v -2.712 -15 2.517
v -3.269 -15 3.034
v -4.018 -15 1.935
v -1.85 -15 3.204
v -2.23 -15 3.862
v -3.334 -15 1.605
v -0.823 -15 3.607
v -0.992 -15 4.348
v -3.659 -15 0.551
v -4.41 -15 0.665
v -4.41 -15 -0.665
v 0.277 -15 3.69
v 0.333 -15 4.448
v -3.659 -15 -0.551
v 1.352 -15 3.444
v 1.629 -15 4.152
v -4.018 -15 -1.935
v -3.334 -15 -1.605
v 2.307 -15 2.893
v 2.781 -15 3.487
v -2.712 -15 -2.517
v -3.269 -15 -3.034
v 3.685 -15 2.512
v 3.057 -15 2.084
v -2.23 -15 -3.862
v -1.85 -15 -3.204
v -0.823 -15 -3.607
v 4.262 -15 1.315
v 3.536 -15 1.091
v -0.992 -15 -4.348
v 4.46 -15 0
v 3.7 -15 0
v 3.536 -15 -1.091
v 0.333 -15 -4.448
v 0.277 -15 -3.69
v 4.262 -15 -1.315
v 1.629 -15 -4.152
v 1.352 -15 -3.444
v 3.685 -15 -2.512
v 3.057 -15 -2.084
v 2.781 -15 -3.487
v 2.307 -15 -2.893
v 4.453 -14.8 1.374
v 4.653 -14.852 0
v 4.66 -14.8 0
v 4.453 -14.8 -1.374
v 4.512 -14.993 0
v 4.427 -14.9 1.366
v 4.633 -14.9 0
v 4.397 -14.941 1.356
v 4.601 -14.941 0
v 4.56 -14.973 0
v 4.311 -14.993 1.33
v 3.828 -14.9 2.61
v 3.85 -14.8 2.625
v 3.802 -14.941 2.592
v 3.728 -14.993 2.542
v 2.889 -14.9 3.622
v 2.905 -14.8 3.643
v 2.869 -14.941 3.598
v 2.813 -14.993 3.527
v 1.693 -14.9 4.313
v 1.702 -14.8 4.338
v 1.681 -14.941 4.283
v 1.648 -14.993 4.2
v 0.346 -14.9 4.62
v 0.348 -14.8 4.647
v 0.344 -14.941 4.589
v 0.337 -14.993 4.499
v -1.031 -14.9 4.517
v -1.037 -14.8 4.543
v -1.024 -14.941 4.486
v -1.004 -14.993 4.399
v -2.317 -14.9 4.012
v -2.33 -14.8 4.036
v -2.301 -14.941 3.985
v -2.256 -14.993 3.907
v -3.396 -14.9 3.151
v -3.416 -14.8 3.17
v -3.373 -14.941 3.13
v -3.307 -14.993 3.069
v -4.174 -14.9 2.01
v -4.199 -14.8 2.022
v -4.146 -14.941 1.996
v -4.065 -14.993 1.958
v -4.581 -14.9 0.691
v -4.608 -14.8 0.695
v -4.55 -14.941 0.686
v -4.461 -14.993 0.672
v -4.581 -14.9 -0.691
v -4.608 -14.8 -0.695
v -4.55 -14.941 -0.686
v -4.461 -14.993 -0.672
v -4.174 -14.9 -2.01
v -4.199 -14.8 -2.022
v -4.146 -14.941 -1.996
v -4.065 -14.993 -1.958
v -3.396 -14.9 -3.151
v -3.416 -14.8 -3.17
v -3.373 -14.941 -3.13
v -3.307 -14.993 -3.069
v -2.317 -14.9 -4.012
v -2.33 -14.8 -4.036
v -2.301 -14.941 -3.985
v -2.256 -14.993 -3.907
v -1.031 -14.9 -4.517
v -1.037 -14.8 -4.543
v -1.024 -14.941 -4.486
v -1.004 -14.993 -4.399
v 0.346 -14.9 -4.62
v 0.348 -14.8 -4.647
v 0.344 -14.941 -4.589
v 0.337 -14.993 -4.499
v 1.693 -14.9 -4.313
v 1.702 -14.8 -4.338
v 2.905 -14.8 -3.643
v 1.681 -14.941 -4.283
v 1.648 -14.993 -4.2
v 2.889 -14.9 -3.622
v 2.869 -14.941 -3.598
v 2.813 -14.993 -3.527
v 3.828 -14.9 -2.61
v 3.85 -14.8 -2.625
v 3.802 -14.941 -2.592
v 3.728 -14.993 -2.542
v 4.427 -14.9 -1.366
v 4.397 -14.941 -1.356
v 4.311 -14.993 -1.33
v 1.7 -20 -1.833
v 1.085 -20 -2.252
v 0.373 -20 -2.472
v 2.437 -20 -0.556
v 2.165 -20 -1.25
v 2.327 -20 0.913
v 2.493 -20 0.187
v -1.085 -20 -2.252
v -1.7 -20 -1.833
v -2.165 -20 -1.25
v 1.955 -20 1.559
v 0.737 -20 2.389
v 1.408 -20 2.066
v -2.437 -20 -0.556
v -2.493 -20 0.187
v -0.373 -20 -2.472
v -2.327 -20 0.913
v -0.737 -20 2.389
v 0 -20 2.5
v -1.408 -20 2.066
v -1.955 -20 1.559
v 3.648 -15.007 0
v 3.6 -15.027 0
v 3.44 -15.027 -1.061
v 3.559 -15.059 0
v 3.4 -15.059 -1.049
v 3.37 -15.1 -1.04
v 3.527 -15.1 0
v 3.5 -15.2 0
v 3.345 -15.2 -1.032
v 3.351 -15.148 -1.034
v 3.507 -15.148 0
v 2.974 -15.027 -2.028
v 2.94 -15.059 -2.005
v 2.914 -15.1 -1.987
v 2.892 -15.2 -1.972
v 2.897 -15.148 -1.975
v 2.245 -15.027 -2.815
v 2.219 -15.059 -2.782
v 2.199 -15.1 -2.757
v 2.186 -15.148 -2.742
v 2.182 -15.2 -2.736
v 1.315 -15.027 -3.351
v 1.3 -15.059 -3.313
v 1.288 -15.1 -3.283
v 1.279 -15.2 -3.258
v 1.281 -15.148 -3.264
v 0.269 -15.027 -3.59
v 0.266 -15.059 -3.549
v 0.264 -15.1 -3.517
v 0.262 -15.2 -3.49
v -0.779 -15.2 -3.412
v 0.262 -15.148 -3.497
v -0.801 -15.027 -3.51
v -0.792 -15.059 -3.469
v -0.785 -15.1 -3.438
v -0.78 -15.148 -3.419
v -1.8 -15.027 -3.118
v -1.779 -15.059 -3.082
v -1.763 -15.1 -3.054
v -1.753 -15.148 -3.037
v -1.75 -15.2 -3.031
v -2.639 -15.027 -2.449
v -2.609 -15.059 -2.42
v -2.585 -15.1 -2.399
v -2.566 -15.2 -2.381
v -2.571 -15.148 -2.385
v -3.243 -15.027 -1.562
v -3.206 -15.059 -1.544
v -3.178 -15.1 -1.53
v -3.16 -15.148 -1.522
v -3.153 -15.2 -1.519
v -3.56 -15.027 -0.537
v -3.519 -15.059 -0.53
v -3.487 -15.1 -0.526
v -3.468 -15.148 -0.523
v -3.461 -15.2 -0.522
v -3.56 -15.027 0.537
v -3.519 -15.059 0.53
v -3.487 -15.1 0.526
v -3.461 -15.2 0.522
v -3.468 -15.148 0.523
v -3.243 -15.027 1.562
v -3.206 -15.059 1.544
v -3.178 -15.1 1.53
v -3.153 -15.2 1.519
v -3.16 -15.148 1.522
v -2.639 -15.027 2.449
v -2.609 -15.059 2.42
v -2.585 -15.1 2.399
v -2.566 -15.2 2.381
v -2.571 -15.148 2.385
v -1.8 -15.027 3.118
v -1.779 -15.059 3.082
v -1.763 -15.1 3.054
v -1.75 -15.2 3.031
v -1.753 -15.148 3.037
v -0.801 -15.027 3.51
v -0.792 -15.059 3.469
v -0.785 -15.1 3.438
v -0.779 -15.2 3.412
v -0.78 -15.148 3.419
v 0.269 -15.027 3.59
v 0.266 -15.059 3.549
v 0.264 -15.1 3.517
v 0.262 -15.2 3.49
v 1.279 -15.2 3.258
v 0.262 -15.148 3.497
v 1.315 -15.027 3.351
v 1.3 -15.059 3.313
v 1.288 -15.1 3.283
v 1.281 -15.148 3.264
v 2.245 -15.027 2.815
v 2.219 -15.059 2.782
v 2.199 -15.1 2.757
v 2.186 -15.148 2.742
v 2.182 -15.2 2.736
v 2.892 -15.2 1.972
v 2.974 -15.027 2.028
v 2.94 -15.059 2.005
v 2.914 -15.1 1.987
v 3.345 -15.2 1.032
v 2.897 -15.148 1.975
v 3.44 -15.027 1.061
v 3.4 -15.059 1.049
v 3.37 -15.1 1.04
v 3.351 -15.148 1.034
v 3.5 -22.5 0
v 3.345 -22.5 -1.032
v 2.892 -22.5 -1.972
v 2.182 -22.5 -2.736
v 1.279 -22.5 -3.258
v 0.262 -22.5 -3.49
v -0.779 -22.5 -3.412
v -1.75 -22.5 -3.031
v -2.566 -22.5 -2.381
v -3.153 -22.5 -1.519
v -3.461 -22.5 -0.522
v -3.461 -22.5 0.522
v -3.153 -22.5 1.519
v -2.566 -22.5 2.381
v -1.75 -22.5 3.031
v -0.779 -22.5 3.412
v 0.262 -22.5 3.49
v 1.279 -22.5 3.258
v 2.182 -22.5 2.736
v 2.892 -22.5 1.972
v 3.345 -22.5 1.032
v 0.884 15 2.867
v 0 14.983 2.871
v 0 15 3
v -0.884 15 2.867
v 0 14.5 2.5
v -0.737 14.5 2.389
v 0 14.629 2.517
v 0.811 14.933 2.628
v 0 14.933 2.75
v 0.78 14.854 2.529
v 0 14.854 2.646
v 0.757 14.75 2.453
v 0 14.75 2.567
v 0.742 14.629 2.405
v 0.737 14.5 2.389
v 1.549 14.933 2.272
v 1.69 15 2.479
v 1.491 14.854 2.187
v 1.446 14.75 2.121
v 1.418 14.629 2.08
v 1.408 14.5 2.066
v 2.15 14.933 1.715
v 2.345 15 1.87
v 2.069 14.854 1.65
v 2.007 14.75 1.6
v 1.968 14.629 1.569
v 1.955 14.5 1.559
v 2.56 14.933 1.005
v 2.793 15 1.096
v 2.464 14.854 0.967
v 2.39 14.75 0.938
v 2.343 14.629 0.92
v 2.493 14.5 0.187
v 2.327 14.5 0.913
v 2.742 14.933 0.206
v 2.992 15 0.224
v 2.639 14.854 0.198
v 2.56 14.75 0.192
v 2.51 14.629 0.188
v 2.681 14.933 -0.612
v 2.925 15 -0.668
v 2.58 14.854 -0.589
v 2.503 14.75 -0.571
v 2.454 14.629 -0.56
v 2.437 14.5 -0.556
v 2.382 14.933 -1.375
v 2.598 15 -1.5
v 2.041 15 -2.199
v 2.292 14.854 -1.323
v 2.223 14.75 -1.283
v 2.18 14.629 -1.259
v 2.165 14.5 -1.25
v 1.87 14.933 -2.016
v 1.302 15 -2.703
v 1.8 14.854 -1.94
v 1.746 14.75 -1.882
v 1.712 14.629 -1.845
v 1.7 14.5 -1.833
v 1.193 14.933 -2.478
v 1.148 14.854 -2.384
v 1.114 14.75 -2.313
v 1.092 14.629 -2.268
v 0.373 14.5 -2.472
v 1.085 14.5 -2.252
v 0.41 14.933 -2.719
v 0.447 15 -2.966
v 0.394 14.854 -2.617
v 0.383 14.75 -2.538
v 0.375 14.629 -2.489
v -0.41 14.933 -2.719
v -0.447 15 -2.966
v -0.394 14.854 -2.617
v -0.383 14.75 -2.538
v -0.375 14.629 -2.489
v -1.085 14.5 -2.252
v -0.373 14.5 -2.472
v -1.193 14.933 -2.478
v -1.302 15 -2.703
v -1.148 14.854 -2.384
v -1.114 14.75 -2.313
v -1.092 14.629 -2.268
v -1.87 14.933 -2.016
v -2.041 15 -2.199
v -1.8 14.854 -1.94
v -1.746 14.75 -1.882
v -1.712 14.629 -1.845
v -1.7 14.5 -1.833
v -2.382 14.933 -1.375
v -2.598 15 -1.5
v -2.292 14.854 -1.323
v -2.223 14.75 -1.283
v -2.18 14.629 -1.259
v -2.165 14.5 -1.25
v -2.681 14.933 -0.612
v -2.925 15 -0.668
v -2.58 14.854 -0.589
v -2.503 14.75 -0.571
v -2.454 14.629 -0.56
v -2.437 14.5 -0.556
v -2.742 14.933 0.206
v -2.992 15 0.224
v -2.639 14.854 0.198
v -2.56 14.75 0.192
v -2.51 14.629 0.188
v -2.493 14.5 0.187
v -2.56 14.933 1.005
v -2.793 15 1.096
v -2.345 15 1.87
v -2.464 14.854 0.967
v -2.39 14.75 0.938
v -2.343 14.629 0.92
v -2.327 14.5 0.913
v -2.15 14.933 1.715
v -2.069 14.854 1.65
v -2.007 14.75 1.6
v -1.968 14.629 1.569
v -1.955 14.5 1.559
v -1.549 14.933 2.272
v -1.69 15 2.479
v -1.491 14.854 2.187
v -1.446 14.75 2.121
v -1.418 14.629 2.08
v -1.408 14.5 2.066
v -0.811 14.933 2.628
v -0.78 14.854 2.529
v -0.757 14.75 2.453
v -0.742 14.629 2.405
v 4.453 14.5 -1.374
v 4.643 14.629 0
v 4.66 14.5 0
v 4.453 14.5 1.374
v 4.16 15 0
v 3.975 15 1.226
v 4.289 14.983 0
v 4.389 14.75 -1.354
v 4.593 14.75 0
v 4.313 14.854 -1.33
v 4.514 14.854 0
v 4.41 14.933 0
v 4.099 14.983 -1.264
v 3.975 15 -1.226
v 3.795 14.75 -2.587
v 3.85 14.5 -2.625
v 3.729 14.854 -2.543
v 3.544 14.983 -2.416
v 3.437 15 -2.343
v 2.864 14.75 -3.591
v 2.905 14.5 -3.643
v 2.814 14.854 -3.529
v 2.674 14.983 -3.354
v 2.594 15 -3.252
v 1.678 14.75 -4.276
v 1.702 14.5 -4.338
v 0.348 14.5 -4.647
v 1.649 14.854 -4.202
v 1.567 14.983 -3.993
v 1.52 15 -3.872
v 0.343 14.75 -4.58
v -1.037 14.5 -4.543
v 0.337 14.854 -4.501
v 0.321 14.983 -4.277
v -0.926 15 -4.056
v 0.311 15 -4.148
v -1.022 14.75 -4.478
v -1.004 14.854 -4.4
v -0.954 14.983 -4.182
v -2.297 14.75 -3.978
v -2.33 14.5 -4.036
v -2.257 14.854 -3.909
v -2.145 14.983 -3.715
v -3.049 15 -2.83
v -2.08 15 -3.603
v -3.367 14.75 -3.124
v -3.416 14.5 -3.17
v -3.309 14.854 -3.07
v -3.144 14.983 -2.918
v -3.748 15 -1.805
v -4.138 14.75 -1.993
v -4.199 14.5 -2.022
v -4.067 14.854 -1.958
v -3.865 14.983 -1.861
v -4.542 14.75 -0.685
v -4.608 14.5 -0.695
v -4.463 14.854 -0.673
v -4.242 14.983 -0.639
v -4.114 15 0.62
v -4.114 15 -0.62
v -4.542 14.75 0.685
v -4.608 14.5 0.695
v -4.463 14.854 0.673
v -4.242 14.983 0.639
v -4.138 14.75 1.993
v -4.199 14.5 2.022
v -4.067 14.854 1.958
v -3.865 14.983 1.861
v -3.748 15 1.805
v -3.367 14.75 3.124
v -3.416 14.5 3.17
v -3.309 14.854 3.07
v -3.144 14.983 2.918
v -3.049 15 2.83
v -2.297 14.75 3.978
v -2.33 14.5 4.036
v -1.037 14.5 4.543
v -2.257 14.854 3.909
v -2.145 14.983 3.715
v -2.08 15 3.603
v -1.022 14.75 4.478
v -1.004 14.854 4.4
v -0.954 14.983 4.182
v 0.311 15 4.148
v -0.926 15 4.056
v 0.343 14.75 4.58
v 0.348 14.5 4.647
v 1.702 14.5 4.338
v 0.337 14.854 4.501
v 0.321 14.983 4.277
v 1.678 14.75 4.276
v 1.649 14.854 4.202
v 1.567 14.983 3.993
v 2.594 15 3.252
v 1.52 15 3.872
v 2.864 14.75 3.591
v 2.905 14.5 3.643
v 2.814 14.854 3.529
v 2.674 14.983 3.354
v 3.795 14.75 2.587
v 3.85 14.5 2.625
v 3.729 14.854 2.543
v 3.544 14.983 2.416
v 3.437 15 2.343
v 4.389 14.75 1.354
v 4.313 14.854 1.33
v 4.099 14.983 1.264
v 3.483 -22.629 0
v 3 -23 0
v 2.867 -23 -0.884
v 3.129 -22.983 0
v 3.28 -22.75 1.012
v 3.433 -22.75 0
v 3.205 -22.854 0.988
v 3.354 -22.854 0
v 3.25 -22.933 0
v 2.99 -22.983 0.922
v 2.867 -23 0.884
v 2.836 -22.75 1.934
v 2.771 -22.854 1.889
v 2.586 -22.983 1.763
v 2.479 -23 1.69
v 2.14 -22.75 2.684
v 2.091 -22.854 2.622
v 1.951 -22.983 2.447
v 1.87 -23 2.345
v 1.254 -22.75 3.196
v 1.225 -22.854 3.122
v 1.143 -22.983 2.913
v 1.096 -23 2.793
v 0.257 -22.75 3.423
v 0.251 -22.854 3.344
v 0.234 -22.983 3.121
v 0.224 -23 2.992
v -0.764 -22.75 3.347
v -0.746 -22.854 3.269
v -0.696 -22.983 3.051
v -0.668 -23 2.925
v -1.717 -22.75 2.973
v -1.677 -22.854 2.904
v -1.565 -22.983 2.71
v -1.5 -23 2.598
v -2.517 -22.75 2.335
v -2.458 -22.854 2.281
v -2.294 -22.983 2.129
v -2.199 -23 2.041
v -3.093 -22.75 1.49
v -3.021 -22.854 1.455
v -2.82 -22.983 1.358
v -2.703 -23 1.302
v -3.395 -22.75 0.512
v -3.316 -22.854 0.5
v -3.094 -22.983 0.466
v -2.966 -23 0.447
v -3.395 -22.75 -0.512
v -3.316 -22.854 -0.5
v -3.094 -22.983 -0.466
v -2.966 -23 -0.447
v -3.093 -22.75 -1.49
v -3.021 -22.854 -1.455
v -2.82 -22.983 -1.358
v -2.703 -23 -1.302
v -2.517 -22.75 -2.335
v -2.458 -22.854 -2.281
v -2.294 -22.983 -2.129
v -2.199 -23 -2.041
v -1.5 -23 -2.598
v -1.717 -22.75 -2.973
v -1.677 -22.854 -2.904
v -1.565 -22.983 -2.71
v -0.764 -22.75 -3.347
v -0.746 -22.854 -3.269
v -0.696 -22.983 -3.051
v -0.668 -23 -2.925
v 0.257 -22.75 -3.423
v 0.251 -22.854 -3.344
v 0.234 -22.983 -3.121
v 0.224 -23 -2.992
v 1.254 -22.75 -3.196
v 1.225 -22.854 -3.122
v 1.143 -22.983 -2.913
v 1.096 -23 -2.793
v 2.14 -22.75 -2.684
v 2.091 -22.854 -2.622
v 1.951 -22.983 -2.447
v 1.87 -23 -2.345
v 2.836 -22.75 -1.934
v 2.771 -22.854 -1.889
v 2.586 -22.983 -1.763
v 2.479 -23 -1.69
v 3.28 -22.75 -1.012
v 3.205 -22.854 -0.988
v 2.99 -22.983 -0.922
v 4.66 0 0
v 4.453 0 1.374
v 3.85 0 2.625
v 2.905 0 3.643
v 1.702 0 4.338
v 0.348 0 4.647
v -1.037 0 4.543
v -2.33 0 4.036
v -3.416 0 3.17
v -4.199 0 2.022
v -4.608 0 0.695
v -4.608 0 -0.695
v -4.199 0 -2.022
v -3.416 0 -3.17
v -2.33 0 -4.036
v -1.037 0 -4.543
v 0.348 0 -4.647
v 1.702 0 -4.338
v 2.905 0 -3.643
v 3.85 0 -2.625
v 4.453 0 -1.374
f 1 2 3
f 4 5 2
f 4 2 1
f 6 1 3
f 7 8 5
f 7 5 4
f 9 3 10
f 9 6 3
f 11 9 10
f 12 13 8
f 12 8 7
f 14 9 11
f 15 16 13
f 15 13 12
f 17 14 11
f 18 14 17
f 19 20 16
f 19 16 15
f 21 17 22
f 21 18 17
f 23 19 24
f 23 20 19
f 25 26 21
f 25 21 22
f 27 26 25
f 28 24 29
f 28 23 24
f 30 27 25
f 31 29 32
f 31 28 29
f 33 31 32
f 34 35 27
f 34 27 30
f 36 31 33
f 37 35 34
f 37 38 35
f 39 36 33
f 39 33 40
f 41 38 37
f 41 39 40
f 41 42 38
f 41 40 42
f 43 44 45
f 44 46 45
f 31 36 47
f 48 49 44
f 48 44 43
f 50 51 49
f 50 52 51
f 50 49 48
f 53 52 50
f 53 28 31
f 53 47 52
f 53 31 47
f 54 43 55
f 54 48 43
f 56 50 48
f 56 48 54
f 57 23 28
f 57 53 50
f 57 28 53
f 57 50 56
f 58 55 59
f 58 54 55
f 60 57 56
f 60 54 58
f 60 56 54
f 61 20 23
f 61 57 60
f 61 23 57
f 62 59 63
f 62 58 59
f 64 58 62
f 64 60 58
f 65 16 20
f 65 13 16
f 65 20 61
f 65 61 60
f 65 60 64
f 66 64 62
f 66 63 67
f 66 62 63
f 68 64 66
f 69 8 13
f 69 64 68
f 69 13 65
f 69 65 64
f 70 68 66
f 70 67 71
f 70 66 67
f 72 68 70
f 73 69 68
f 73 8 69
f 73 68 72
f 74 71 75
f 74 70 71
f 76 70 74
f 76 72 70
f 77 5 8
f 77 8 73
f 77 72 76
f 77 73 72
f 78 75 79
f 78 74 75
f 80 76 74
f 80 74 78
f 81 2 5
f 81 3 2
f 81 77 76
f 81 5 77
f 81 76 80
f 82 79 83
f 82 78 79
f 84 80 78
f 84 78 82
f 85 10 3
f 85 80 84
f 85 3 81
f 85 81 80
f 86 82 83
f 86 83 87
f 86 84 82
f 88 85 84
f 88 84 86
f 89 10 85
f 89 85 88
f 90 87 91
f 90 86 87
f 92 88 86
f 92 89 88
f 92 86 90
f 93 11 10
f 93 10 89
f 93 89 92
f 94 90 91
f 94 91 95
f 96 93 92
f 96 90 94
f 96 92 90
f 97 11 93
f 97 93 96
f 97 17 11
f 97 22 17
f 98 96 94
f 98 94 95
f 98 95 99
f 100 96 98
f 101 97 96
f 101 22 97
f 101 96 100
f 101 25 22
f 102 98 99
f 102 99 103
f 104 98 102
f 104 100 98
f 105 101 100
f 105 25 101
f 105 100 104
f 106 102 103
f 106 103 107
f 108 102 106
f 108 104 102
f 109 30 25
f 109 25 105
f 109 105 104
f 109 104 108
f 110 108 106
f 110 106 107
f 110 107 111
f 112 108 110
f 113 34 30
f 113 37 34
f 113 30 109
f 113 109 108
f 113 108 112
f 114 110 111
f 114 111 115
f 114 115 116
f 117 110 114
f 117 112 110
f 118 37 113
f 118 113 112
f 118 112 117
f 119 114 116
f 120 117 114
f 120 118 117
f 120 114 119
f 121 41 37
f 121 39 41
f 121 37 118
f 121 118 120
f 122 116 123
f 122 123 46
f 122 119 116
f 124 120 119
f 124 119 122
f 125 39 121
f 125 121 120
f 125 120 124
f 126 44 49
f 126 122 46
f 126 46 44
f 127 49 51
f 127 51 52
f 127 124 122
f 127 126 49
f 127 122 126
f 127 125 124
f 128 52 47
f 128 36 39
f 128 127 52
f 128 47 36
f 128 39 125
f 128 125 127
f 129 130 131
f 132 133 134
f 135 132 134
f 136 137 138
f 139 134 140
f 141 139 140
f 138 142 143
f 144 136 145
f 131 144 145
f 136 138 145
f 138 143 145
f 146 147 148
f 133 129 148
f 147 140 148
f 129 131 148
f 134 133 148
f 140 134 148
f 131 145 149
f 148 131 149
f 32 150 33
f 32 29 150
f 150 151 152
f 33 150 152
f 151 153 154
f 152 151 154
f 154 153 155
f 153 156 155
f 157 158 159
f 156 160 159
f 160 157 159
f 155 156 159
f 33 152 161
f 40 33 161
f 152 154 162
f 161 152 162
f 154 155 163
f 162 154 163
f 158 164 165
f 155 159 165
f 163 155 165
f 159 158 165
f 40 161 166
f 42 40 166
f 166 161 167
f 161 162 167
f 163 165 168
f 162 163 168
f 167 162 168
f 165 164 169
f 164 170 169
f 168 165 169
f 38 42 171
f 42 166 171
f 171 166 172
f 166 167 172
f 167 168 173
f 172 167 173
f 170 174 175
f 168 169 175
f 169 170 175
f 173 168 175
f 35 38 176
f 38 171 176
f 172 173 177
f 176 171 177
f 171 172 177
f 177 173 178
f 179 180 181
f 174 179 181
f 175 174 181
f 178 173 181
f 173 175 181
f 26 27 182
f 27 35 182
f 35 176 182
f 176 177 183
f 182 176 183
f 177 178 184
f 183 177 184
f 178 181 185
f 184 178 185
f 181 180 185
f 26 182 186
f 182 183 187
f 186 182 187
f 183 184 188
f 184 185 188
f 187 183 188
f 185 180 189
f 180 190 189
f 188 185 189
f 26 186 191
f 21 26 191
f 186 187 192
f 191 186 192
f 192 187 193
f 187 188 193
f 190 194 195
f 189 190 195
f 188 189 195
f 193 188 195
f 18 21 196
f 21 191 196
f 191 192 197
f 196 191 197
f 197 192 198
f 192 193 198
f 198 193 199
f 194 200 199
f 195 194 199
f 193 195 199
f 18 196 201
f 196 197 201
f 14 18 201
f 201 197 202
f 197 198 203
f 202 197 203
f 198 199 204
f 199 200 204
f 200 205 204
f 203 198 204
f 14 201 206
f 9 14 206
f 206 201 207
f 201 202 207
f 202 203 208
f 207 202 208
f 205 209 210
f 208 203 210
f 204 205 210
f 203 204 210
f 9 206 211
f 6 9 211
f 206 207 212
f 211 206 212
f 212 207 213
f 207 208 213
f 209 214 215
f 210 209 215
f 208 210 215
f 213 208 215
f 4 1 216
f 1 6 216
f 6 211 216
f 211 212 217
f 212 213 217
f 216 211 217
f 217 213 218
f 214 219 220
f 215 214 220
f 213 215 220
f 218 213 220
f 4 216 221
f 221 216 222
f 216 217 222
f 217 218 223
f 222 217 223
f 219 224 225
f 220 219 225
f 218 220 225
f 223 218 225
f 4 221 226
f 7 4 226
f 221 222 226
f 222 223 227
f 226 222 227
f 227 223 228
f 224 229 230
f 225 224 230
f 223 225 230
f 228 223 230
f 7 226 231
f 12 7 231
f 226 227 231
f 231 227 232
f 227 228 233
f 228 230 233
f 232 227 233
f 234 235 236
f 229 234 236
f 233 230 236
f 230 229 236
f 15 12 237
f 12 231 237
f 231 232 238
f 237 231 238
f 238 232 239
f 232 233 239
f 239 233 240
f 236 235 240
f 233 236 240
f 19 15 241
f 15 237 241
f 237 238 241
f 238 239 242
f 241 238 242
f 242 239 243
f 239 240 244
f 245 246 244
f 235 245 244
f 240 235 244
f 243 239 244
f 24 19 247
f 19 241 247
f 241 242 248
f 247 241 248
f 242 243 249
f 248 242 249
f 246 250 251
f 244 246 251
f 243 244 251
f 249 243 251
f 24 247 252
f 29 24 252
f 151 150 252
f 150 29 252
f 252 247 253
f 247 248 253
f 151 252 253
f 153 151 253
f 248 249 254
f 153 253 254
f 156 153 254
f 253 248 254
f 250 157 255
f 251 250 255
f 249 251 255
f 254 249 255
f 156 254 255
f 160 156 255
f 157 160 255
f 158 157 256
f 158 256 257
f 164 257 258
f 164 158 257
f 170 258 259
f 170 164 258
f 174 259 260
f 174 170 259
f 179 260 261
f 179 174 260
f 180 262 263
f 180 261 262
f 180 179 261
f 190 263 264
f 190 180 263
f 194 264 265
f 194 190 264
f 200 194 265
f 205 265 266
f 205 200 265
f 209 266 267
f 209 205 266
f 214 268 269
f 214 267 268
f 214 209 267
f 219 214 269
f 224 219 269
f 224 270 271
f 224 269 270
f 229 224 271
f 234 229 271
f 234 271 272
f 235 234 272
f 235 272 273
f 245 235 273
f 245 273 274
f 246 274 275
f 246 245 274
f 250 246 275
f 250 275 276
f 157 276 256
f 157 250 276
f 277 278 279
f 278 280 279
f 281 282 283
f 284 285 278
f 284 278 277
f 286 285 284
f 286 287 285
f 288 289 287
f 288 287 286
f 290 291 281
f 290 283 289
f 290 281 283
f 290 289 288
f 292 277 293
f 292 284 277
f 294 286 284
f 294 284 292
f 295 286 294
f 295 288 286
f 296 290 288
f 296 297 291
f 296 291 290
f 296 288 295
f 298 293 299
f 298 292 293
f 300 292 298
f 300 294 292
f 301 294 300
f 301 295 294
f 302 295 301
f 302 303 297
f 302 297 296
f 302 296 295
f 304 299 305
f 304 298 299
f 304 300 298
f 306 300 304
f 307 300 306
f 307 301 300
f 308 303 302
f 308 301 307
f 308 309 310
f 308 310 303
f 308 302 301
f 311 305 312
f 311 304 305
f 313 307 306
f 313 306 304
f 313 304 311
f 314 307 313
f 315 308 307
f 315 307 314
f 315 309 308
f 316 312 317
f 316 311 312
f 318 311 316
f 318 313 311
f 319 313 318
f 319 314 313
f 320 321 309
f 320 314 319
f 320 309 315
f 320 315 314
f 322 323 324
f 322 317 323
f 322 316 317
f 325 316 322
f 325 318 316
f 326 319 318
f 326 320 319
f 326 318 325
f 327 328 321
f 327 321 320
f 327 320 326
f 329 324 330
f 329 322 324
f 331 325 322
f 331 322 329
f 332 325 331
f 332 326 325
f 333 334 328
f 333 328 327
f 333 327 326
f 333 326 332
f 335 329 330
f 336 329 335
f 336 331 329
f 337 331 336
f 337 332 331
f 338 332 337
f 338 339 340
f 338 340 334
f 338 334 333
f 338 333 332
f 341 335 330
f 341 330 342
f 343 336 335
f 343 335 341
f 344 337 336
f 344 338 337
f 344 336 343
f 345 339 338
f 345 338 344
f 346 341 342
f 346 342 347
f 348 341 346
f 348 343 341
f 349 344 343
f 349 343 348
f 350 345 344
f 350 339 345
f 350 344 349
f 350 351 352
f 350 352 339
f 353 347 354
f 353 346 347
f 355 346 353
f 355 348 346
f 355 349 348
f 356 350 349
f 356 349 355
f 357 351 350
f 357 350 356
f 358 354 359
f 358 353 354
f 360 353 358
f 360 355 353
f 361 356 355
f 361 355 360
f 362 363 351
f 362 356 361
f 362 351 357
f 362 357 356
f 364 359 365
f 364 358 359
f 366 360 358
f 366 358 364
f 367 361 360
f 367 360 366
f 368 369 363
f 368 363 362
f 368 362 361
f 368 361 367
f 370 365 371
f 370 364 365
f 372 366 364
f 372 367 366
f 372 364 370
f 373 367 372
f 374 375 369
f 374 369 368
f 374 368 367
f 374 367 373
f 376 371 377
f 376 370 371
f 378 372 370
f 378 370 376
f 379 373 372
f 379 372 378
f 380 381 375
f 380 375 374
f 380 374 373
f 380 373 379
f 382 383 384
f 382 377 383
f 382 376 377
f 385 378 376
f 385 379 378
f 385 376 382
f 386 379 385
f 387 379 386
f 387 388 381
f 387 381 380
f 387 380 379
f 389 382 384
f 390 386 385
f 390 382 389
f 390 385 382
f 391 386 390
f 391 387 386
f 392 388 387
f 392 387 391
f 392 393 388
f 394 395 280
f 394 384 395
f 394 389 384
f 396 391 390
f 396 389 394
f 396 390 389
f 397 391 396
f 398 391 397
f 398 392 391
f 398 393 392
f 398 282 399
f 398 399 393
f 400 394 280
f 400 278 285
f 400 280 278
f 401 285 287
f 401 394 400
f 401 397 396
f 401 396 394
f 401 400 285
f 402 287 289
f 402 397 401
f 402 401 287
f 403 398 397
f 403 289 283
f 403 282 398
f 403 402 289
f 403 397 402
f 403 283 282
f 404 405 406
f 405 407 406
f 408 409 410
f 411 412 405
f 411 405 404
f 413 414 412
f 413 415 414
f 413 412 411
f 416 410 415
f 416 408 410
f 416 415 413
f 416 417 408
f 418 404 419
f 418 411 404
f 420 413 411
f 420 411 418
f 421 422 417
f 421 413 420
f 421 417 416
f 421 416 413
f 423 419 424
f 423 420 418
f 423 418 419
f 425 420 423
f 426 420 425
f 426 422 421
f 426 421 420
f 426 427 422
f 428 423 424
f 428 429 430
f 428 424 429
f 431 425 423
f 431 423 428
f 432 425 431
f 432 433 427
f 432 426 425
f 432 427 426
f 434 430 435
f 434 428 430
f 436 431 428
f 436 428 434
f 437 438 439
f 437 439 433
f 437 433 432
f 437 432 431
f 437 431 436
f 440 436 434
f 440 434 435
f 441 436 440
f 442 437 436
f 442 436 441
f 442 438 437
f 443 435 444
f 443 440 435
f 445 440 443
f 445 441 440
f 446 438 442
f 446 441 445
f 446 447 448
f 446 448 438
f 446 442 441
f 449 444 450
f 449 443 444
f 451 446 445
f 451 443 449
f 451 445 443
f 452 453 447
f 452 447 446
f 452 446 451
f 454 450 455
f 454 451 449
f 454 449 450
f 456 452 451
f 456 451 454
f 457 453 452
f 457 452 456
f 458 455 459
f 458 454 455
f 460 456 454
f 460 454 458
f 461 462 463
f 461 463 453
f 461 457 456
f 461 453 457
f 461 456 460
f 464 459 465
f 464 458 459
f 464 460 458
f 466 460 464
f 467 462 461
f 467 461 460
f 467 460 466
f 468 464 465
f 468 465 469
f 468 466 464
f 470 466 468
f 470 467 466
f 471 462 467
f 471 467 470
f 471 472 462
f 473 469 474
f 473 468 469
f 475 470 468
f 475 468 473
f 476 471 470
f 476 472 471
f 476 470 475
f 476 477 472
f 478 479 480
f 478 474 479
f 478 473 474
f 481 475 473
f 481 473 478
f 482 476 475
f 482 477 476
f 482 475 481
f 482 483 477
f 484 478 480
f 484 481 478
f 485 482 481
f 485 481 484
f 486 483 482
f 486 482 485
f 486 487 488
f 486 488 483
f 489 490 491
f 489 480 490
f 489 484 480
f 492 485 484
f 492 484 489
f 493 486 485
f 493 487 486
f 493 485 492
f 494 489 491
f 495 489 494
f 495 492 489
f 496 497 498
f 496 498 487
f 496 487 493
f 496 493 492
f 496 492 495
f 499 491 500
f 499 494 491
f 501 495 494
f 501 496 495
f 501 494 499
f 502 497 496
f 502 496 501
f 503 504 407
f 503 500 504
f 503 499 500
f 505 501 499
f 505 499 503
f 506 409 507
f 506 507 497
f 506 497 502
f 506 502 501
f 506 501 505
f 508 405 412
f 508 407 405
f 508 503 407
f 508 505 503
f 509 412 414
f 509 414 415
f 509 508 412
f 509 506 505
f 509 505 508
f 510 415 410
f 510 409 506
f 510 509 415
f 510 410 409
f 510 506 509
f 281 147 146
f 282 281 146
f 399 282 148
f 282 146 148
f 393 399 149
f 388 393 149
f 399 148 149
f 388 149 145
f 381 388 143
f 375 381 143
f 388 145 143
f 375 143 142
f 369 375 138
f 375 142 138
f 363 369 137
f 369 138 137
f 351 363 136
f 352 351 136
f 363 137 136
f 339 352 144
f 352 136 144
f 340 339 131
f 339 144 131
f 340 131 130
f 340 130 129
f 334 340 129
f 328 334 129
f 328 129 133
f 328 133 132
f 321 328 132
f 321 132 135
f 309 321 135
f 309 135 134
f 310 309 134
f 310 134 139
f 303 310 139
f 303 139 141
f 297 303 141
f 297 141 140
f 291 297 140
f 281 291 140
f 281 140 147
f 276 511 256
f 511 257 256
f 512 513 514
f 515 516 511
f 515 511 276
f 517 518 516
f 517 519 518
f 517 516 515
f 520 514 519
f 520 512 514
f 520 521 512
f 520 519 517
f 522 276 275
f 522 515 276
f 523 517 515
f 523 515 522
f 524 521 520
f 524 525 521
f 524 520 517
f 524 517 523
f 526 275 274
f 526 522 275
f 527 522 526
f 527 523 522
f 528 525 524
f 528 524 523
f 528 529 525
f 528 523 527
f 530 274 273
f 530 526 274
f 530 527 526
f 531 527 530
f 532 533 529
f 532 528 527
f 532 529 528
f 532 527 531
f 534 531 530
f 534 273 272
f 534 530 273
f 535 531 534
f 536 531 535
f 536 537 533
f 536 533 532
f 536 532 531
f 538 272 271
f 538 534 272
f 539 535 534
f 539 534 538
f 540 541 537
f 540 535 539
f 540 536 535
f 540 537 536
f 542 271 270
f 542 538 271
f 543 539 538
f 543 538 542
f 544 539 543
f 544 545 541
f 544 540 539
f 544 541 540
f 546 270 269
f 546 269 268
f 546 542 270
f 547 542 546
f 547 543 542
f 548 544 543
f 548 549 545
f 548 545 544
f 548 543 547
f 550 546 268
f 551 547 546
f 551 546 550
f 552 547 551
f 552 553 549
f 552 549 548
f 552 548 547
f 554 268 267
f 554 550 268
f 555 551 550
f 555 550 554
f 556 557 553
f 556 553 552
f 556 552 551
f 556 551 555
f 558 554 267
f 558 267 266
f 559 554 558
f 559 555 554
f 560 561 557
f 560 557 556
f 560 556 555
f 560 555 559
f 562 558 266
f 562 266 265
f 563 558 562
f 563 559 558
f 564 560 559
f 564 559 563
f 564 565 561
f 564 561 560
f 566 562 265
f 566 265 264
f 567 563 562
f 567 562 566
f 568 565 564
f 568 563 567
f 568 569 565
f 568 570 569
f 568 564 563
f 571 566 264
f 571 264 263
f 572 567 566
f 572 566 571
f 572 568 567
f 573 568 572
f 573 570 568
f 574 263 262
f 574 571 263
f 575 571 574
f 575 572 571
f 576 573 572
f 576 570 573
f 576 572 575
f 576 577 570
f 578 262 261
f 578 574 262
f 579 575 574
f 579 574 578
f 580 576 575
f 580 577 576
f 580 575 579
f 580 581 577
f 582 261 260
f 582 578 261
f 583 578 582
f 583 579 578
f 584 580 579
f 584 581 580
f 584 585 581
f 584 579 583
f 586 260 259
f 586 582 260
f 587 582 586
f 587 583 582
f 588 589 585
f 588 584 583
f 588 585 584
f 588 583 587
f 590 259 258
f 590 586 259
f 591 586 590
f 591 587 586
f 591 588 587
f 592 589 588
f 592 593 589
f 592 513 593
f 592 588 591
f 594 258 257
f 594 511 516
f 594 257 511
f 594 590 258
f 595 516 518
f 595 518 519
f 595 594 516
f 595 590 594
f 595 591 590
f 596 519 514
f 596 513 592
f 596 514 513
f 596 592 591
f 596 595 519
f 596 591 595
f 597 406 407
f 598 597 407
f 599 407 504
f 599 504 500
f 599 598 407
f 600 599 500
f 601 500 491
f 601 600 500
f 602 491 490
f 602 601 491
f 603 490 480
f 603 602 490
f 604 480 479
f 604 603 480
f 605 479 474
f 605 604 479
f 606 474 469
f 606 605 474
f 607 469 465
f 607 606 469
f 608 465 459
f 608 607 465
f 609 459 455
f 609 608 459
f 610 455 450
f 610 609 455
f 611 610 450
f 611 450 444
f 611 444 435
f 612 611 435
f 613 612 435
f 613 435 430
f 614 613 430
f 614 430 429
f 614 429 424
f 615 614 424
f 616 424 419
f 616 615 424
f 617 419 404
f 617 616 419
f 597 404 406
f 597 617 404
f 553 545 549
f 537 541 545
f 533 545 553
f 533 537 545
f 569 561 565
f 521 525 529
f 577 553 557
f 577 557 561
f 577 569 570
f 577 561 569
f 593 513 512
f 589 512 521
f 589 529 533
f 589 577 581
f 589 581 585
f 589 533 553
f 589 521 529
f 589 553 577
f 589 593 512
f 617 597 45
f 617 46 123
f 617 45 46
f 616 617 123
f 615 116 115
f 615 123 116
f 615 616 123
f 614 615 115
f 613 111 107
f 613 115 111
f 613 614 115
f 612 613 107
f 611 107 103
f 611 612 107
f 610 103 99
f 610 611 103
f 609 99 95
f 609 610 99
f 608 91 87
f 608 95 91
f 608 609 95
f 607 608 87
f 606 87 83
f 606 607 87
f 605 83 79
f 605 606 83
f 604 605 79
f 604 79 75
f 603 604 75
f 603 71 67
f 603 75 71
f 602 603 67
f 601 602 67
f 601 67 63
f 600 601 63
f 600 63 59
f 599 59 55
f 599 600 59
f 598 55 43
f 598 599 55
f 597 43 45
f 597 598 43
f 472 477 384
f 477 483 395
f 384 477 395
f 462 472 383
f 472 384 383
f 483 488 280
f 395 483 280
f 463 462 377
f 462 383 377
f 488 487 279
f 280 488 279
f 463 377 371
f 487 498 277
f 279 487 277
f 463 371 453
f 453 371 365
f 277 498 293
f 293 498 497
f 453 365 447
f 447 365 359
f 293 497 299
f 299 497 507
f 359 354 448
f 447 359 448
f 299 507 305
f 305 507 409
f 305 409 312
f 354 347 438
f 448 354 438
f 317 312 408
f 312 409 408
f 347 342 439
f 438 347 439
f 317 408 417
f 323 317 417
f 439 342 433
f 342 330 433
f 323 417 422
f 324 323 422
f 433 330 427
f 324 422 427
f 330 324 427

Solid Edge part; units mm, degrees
sketch "Sketch1" plane through (0, 0, 0) normal (0, -1, 0) x (1, 0, 0)
  circle A0 centre (0, 0) radius 4.66
  dimension "D1" = 9.32
extrude "Protrusion1" add sketch "Sketch1" along normal mid plane 30
sketch "Sketch2" plane through (0, -15, 0) normal (0, -1, 0) x (1, 0, 0)
  circle A0 centre (0, 0) radius 3.5
  dimension "D1" = 7
extrude "ExtrudedProtrusion_2" add sketch "Sketch2" along normal blind 8
hole "Hole_1" at (0, 15, 0) direction (0, -1, 0) diameter 5 depth 35
fillet "Round_1" radius 0.5 3 edges at (-4.66, 15, 0) (0, 15, -2.5) (-3.5, -23, 0)
fillet "Round_2" radius 0.2 2 edges at (-3.5, -15, 0) (-4.66, -15, 0)
